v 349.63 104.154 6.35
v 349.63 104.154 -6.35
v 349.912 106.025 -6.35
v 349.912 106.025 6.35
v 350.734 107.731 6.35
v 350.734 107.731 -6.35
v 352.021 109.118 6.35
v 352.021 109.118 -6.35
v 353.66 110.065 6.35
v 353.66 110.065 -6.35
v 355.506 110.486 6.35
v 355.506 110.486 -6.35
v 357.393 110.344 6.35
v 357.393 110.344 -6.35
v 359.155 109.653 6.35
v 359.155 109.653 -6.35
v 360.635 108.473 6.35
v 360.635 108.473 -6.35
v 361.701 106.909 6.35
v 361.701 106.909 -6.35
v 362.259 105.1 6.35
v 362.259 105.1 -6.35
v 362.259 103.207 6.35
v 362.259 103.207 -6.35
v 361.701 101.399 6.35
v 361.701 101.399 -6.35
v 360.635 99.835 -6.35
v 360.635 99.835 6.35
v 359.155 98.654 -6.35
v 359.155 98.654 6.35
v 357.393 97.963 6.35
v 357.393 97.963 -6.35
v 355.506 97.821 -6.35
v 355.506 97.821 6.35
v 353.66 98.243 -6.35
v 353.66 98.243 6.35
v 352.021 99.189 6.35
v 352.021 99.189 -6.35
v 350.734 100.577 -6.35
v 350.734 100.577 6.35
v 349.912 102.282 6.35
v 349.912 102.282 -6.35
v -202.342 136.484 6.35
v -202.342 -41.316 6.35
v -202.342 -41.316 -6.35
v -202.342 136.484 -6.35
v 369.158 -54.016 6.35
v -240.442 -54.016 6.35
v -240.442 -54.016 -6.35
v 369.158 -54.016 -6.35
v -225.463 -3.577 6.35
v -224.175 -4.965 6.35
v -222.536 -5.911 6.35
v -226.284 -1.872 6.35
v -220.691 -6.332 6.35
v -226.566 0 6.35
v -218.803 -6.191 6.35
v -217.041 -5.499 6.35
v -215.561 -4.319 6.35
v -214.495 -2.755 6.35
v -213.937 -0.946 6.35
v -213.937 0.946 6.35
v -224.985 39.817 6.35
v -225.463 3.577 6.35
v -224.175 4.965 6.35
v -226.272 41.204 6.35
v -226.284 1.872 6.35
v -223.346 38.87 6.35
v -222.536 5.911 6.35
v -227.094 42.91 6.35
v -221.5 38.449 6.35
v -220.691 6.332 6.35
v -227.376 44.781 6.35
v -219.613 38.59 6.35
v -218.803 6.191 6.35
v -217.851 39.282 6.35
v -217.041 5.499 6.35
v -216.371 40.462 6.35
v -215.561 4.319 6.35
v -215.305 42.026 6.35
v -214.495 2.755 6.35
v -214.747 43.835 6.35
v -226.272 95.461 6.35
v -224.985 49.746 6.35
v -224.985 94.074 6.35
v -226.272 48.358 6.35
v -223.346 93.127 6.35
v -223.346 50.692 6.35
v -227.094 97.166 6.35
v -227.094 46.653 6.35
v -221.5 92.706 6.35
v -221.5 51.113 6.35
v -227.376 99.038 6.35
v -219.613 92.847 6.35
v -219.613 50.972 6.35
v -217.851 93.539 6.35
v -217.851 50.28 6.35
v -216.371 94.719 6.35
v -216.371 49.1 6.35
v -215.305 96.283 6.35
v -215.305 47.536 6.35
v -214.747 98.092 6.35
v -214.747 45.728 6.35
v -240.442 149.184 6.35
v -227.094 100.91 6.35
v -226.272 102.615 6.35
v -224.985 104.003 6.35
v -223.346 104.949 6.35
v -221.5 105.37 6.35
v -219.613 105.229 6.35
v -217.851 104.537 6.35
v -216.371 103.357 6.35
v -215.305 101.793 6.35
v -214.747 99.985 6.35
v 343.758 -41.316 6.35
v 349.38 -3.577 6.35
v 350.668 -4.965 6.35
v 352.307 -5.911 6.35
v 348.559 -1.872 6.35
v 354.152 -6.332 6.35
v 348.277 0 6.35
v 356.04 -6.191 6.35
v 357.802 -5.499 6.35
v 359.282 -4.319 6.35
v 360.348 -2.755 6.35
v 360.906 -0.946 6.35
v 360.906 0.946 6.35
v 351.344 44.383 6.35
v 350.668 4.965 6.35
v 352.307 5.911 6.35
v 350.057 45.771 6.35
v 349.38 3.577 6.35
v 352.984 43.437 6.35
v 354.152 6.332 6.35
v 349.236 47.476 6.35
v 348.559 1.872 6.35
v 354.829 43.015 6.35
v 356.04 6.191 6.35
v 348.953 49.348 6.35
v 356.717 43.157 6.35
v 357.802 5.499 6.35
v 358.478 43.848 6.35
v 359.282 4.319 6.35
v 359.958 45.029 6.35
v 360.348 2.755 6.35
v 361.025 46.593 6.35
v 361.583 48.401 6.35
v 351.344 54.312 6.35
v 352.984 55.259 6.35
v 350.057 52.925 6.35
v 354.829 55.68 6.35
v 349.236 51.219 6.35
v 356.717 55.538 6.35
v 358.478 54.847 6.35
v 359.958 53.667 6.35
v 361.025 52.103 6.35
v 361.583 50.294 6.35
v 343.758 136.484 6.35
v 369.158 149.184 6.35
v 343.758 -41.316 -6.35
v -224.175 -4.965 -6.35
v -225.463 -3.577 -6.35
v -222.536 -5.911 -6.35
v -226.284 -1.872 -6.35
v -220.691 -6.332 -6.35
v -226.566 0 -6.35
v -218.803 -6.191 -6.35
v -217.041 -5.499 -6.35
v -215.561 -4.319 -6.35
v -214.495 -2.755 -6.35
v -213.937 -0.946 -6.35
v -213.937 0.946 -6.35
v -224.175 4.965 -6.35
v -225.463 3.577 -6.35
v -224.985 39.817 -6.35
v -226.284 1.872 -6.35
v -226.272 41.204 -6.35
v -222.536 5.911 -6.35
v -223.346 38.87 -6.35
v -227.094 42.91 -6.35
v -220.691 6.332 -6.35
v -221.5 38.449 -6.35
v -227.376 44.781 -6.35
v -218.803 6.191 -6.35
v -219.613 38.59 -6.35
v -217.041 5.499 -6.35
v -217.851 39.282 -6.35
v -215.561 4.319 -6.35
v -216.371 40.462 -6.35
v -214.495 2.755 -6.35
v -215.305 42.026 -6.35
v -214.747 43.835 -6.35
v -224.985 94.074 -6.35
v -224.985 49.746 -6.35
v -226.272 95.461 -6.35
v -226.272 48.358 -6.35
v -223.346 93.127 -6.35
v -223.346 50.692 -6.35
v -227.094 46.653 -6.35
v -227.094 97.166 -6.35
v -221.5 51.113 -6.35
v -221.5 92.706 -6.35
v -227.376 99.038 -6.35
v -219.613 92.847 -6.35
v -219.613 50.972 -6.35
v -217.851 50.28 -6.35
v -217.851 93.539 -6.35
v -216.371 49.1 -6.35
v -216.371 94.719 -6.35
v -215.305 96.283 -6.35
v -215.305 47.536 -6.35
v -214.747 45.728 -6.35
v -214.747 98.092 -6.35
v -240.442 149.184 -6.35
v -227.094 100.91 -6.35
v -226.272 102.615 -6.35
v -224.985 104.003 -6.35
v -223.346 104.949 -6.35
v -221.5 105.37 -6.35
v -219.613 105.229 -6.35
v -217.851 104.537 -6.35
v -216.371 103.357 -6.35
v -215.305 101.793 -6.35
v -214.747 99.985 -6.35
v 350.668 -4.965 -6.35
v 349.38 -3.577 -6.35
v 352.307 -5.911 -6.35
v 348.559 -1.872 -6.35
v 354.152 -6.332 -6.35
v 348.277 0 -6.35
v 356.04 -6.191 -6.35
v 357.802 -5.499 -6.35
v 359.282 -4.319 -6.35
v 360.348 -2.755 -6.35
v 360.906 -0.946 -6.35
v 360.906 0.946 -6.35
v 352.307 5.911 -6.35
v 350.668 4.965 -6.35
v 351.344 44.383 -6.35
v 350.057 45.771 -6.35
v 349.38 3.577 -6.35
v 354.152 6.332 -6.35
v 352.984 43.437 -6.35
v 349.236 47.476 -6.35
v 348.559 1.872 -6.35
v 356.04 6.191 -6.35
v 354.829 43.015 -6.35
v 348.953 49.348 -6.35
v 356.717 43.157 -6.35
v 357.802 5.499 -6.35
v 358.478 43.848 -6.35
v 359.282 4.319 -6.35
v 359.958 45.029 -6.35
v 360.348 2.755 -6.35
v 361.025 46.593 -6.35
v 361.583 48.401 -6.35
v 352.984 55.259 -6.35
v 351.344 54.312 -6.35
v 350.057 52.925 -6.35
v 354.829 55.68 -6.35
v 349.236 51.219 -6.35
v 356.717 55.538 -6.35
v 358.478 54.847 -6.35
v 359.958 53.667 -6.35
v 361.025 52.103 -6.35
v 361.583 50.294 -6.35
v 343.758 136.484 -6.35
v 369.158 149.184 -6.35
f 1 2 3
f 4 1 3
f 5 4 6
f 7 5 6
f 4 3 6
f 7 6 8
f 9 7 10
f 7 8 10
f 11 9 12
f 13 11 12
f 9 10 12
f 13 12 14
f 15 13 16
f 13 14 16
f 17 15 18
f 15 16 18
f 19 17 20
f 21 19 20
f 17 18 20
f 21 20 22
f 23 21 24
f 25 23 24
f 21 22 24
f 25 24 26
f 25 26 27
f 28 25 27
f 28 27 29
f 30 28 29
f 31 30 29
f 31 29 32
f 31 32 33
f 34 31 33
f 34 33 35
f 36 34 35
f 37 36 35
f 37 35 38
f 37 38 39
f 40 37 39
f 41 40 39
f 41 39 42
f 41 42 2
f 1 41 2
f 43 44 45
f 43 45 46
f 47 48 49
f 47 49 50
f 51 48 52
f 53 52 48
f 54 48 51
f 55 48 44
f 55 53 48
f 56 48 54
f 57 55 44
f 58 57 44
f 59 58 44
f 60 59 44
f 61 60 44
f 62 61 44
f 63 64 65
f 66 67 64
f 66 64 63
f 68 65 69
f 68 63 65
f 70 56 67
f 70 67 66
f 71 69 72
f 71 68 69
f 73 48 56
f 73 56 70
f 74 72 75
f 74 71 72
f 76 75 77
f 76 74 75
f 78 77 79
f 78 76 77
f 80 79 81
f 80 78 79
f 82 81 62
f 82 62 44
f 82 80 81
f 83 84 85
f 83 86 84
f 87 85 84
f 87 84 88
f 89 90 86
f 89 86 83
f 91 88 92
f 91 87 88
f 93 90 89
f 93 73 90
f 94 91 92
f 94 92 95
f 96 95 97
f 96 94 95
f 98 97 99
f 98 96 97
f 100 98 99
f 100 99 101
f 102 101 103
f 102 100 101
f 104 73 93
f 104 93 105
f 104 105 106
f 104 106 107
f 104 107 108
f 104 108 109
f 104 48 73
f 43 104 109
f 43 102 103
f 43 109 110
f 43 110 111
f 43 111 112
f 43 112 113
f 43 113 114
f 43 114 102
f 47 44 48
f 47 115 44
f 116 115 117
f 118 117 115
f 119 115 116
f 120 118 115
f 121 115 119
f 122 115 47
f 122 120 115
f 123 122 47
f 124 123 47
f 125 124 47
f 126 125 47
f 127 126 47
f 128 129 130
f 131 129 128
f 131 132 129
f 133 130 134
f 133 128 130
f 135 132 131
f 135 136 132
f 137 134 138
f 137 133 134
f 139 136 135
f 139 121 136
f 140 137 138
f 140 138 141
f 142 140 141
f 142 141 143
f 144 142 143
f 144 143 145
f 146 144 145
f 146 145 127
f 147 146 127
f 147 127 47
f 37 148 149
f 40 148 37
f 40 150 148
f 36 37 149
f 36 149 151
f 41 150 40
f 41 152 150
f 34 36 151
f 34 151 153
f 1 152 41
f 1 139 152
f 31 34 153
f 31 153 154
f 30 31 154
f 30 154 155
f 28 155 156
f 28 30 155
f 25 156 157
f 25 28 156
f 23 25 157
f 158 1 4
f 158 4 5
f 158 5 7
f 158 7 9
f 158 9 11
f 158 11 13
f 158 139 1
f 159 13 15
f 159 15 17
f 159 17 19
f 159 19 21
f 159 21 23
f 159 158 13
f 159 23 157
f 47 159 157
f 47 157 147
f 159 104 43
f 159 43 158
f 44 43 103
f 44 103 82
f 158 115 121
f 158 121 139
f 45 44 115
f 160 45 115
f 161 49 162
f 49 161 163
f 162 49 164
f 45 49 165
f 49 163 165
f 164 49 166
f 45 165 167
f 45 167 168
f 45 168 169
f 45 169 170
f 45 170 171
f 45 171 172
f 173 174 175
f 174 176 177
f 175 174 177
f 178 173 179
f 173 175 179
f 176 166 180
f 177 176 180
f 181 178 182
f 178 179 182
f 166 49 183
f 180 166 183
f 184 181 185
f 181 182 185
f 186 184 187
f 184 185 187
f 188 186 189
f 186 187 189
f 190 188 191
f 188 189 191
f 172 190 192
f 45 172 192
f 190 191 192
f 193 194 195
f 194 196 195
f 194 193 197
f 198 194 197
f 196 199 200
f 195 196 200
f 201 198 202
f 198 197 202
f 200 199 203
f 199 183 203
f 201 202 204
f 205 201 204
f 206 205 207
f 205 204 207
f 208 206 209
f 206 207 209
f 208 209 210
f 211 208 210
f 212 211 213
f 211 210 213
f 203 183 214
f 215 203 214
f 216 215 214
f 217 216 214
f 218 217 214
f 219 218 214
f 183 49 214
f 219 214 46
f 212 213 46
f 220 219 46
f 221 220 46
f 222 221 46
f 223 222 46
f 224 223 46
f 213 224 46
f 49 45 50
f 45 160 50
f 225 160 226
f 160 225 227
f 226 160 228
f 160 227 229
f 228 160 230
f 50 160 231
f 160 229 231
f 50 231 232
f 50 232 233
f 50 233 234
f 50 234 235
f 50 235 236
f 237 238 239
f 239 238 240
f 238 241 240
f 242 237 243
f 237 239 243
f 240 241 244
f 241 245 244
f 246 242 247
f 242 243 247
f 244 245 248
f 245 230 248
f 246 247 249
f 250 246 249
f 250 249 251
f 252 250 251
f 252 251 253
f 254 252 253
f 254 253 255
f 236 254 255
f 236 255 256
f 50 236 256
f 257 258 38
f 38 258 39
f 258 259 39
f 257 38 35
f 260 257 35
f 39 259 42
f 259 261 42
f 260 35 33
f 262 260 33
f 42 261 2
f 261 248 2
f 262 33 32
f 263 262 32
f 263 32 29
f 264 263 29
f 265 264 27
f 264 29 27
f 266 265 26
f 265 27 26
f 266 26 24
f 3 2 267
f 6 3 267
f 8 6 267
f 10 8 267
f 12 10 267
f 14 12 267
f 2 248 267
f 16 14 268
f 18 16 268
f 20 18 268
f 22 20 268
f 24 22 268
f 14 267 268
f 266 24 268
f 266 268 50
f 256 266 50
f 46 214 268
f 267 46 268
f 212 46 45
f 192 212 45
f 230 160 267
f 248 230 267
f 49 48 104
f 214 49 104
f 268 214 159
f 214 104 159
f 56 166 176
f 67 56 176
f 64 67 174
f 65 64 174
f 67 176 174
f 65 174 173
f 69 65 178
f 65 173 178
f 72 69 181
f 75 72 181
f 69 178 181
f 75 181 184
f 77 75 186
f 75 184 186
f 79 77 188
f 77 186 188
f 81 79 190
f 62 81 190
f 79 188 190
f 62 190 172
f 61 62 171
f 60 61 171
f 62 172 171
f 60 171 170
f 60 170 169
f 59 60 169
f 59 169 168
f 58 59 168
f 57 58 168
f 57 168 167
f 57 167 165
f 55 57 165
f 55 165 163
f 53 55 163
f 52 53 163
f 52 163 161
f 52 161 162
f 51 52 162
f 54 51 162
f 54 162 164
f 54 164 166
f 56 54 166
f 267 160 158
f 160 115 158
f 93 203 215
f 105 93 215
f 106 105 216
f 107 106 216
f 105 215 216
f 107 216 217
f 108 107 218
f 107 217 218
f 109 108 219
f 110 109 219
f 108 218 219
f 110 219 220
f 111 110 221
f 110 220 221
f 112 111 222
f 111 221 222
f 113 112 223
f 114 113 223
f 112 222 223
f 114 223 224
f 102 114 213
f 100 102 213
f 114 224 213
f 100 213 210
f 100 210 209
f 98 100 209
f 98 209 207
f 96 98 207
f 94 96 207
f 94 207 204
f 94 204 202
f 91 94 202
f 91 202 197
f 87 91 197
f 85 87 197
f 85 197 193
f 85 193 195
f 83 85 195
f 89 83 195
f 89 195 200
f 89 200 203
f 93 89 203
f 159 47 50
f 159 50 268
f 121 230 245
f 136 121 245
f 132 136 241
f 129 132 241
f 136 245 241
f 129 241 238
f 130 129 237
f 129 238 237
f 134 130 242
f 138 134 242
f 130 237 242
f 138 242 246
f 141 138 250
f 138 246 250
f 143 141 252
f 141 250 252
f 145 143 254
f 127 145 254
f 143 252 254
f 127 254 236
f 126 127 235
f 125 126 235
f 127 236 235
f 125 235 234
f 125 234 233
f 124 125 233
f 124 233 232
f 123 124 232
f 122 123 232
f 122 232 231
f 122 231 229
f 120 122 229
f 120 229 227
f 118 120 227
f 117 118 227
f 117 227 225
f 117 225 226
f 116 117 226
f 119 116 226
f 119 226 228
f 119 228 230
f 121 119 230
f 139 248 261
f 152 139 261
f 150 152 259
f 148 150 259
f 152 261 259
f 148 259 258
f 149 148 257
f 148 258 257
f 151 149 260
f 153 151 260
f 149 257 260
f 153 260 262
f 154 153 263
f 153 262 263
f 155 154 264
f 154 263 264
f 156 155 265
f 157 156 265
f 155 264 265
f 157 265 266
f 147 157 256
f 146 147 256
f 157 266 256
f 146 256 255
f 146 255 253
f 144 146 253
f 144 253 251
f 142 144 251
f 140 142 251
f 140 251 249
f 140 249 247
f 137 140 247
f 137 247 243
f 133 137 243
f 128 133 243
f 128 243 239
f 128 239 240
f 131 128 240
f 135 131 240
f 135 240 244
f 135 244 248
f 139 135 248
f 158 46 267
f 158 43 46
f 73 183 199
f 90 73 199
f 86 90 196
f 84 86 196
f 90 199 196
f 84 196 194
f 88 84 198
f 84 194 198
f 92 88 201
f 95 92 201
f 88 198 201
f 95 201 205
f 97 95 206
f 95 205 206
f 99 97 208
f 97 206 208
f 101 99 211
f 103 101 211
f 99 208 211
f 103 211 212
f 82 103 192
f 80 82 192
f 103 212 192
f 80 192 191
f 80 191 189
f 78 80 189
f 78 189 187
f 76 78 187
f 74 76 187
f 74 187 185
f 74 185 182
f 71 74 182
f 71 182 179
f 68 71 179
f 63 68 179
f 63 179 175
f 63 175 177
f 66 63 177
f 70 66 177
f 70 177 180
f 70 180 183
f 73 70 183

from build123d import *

# Parameters (mm, degrees)
F0_W     = 609.6
F0_H     = 203.2
F0_W_2   = 546.1
F0_H_2   = 177.8
F1_DEPTH = 6.35
F3_D     = 12.7
F5_D     = 12.7


with BuildPart() as f1:
    # F0 (on Top) → F1 (new body, symmetric)
    with BuildSketch(Plane.XY):
        with Locations((64.358067, 47.583953)):
            Rectangle(F0_W, F0_H)
        with Locations((70.708067, 47.583953)):
            Rectangle(F0_W_2, F0_H_2, mode=Mode.SUBTRACT)
    extrude(amount=F1_DEPTH, both=True)

    # F3 (through all)
    with Locations(Plane.XY.offset(6.35)):
        with Locations((-221.025839, 99.038169), (-221.025839, 44.781234), (-220.216036, 0)):
            Hole(F3_D / 2)

    # F5 (through all)
    with Locations(Plane.XY.offset(6.35)):
        with Locations((355.980128, 104.1537), (355.303496, 49.347699), (354.626894, 0)):
            Hole(F5_D / 2)


solid = f1.part
